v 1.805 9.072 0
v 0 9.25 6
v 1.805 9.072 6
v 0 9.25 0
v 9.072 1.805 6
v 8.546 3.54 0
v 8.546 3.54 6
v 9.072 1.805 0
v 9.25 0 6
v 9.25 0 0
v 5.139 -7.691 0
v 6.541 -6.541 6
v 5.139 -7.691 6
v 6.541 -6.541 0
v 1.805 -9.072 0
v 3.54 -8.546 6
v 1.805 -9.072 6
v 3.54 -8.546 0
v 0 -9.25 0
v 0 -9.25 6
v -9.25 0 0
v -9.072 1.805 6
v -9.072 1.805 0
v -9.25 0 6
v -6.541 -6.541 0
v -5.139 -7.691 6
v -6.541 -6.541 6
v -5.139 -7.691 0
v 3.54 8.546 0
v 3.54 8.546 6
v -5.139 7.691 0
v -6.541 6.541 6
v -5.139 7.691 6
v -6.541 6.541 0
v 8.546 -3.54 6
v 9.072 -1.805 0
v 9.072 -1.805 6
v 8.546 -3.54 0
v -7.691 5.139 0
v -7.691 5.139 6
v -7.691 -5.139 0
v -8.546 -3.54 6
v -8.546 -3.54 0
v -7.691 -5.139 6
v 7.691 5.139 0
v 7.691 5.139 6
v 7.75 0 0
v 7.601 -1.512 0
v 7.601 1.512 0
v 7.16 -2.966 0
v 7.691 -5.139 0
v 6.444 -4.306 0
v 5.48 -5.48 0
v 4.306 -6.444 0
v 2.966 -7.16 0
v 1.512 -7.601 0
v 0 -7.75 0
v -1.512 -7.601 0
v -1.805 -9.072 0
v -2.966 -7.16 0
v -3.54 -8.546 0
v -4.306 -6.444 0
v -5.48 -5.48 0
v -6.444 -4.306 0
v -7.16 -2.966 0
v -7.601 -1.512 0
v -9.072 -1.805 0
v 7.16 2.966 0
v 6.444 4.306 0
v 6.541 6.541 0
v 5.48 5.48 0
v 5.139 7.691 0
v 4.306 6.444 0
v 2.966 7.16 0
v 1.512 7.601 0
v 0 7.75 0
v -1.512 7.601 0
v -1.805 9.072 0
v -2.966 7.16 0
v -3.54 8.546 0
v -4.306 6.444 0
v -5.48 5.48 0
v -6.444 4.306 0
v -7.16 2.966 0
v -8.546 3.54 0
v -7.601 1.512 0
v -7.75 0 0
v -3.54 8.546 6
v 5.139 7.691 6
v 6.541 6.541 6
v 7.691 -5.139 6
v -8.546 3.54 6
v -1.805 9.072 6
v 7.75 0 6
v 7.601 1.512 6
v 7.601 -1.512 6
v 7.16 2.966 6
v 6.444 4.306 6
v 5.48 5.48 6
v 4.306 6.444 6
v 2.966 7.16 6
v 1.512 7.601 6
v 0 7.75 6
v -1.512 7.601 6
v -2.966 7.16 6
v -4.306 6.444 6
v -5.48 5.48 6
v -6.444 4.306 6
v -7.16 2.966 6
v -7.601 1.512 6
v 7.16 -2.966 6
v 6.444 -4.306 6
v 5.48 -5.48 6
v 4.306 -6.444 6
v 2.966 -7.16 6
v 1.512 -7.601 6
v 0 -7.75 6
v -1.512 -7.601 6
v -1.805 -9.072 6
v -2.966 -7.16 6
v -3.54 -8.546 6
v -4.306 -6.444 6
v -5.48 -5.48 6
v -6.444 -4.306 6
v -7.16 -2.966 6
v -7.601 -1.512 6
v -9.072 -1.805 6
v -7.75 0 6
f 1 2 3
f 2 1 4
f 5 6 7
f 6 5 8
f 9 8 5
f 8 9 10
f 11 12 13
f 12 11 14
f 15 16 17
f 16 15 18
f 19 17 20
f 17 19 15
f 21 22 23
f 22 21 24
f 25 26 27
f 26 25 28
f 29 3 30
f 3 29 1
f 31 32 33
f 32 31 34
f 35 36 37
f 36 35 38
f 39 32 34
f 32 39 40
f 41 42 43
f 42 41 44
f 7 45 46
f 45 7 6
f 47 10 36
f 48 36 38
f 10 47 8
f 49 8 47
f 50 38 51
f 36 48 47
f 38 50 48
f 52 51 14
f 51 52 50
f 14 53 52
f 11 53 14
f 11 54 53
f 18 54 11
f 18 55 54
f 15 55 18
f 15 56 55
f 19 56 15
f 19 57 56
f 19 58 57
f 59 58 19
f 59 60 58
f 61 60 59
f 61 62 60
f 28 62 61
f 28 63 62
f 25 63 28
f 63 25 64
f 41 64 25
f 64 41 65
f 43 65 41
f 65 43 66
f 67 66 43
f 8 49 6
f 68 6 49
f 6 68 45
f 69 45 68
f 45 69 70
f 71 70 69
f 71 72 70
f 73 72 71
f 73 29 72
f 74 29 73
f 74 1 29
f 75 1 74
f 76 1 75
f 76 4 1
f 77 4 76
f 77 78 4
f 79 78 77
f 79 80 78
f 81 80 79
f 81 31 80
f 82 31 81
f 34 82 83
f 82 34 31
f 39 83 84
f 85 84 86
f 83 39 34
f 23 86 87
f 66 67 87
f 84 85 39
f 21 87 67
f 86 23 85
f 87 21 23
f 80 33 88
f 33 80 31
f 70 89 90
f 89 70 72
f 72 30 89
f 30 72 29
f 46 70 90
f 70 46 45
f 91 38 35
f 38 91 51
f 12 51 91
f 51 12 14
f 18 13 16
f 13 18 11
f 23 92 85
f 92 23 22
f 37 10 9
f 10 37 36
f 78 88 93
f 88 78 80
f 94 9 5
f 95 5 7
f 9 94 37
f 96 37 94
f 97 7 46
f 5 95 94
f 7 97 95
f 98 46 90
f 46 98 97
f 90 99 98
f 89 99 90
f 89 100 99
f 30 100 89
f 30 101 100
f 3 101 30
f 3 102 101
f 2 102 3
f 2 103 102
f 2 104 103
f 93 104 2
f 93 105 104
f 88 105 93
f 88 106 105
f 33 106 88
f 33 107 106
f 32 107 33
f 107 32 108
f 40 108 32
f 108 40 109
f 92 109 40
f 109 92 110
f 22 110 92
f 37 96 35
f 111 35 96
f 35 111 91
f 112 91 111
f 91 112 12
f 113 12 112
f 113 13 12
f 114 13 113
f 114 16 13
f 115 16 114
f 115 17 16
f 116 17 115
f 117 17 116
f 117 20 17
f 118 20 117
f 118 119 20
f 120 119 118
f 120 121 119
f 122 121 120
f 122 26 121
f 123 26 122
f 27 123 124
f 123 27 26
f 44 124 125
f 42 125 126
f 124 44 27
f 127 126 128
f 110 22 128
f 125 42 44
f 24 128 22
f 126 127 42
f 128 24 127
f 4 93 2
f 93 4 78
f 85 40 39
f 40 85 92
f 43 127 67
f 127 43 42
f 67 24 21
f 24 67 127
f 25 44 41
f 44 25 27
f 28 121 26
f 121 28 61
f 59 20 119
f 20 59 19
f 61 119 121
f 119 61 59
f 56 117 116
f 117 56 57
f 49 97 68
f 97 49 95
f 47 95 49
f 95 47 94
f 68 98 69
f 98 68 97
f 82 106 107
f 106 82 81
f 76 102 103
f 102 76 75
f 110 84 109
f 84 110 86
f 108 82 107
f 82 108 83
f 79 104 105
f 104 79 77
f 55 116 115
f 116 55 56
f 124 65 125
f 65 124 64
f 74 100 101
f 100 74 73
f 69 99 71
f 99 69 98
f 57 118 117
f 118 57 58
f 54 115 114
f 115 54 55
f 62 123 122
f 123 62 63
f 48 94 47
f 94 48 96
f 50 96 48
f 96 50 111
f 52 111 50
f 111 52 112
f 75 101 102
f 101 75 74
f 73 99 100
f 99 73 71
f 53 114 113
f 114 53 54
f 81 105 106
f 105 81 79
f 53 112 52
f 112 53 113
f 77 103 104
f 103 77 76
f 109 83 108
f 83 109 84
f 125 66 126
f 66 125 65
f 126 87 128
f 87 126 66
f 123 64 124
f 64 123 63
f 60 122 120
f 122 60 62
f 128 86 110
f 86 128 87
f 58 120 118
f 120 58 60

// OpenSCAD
$fn = 32;

// ----------------------------------------------------------------------
// Spacer sleeve: 18.5 / 15.5 x 6 mm
// ----------------------------------------------------------------------

// --- parameters (mm) ---
outer_d = 18.5;           // outside diameter
inner_d = 15.5;           // shaft bore
length = 6;               // sleeve length

module sleeve() {
  cylinder(h = length, d = outer_d);
}

difference() {
  sleeve();
  translate([0, 0, -1]) cylinder(h = length + 2, d = inner_d);
}
